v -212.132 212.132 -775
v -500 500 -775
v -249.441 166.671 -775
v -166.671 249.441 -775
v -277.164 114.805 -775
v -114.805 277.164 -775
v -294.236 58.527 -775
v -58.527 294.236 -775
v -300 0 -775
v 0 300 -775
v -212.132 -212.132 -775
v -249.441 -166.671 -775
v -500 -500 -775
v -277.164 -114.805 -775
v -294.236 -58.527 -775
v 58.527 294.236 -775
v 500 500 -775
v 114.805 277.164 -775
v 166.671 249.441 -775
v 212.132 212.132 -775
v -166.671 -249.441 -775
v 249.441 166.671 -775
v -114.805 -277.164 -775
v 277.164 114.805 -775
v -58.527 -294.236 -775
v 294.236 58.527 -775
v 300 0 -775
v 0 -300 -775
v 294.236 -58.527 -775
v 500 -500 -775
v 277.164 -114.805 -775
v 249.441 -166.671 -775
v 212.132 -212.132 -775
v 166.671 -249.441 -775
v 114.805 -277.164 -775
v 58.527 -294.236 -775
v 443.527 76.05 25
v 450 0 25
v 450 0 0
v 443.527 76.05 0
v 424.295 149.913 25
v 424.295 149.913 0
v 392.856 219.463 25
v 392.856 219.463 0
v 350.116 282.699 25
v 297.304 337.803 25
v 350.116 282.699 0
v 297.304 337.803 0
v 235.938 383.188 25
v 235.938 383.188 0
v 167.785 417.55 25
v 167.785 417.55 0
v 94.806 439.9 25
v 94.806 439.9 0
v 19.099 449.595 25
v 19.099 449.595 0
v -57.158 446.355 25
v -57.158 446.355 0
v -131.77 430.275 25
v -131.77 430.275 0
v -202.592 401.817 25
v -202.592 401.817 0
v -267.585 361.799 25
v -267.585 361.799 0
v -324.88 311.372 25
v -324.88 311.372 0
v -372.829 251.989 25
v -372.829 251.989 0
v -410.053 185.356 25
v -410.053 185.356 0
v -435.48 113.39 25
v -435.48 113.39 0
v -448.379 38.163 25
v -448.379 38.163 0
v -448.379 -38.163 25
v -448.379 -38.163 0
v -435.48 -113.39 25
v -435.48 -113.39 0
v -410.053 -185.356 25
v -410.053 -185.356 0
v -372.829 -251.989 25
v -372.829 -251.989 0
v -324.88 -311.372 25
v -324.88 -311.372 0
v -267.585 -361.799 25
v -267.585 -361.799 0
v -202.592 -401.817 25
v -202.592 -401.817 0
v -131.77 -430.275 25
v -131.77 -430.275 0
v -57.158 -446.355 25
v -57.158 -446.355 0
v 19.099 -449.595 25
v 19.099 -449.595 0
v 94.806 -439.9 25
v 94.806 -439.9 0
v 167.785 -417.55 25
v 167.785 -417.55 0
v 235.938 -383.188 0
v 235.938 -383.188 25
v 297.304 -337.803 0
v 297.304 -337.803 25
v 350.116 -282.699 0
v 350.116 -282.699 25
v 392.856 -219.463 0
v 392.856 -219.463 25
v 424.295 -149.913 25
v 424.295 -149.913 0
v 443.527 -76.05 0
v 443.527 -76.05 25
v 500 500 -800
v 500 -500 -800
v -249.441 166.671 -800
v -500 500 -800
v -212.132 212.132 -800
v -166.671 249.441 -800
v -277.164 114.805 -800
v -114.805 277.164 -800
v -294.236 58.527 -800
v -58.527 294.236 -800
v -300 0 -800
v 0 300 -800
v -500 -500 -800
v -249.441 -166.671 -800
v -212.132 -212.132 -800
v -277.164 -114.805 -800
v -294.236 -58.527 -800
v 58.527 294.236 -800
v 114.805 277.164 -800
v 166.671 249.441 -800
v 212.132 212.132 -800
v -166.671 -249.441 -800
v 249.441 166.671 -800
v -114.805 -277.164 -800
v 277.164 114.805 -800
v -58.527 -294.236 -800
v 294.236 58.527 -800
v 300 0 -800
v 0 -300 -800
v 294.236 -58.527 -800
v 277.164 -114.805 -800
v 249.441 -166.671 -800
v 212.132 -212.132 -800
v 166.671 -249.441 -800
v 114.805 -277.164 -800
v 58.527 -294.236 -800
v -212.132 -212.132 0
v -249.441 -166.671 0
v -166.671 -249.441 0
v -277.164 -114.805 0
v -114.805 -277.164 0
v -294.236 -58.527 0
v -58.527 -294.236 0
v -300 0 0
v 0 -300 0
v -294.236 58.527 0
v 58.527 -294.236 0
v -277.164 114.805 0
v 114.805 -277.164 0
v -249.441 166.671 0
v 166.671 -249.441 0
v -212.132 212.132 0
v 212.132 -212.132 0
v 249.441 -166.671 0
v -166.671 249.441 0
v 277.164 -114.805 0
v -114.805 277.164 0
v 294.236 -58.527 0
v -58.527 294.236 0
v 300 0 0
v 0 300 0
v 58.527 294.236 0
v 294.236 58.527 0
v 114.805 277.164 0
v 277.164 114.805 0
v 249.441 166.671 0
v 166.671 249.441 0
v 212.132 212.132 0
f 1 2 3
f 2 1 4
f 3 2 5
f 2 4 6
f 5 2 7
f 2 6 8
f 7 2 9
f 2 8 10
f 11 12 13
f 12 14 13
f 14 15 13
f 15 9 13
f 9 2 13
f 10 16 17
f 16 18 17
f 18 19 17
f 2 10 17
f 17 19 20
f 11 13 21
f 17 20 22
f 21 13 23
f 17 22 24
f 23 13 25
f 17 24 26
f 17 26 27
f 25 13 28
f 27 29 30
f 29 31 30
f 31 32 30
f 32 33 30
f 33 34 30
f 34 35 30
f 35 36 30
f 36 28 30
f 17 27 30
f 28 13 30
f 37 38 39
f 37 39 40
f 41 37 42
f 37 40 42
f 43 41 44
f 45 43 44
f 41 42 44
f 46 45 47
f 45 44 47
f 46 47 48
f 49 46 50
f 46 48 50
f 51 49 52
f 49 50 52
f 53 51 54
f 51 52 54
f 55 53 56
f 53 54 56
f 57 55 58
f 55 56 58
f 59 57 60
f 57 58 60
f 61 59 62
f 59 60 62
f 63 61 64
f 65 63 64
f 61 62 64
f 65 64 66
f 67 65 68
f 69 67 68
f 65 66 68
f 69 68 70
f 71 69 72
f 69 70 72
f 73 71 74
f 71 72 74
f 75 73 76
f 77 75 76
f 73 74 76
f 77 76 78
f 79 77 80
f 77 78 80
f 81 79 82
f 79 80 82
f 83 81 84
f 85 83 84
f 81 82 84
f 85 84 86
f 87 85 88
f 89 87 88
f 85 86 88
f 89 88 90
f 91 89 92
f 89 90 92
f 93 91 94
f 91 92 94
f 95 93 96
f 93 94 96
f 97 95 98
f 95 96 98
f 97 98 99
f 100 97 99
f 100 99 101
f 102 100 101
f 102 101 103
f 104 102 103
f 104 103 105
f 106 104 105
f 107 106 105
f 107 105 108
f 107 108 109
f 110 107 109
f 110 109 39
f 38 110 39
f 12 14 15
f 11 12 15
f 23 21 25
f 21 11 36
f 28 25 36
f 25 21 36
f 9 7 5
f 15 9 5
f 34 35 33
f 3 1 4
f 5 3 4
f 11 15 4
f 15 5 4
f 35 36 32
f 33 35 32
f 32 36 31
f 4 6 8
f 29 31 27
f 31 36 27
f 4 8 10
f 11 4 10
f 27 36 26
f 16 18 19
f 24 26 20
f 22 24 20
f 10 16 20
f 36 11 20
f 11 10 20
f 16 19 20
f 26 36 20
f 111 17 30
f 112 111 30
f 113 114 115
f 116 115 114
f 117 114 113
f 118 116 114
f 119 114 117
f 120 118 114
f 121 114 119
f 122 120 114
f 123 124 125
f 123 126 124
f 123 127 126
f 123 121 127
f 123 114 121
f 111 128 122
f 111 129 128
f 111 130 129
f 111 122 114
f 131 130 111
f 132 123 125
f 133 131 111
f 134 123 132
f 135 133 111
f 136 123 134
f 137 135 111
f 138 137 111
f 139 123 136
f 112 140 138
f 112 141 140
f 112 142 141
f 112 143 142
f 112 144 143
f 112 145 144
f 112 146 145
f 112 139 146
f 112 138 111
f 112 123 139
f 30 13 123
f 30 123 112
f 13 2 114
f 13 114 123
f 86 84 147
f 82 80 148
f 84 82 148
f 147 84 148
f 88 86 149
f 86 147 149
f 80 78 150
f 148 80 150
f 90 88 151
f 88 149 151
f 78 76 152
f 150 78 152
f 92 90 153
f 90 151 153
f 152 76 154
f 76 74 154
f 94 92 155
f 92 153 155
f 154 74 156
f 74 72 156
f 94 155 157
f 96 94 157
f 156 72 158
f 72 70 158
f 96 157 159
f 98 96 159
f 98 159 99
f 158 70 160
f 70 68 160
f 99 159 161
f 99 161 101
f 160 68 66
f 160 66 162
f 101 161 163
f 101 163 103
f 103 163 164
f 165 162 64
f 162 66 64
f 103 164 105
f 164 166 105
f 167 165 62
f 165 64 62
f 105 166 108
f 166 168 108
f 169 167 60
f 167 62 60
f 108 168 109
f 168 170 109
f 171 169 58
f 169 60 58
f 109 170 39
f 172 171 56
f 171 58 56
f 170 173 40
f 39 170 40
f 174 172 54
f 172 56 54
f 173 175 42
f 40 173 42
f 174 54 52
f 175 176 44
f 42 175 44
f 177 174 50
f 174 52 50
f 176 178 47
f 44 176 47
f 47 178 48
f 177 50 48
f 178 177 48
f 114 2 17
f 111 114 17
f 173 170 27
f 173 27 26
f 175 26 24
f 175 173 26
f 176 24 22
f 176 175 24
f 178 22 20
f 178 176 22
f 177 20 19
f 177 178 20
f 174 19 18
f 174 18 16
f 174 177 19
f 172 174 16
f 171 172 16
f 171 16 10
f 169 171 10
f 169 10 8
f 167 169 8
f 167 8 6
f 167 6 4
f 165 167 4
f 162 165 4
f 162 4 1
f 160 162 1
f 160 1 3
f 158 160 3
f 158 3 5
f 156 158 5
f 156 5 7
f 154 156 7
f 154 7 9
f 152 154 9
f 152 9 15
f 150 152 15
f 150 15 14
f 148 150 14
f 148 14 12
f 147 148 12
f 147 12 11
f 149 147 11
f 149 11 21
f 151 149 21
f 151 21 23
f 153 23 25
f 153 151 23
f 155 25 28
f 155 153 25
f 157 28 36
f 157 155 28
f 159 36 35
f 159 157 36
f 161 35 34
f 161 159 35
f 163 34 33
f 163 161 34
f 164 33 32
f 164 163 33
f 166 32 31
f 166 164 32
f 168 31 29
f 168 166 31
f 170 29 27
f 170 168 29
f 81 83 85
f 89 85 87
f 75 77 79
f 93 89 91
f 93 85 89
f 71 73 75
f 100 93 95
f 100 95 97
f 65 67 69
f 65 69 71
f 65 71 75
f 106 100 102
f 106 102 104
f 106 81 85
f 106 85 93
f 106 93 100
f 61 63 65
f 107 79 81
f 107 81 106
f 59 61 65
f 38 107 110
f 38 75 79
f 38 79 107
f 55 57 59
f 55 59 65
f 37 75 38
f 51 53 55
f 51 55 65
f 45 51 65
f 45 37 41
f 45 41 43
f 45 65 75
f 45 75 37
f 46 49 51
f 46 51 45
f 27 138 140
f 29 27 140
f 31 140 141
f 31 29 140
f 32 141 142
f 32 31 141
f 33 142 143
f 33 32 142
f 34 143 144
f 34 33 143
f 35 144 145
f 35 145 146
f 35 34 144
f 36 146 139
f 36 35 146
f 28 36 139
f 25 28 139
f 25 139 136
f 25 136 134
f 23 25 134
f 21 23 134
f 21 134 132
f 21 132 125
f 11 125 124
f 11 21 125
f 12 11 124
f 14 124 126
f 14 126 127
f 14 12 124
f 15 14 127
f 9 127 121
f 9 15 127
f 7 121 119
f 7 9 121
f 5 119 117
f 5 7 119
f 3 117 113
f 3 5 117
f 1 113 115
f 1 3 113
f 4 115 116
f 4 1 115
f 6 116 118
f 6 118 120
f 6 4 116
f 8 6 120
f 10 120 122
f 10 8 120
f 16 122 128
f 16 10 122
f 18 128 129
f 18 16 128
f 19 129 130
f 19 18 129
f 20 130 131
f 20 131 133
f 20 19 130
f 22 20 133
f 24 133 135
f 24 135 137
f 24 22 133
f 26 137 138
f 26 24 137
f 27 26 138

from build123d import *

# Parameters (mm, degrees)
F0_R     = 450
F1_DEPTH = 25
F2_R     = 300
F3_DEPTH = 800
F4_W     = 1000
F4_H     = 1000
F4_R     = 300
F5_DEPTH = 25


with BuildPart() as f1:
    # F0 (on Top) → F1 (new body)
    with BuildSketch(Plane.XY):
        Circle(F0_R)
    extrude(amount=F1_DEPTH)

    # F2 (on face) → F3 (join)
    with BuildSketch(Plane.XY.offset(25)):
        Circle(F2_R)
    extrude(amount=-F3_DEPTH)


with BuildPart() as f5:
    # F4 (on face) → F5 (new body)
    with BuildSketch(Plane(origin=(0, 0, -775), x_dir=(1, 0, 0), z_dir=(0, 0, -1))):
        Rectangle(F4_W, F4_H)
        Circle(F4_R, mode=Mode.SUBTRACT)
    extrude(amount=F5_DEPTH)


solid = Compound([f1.part, f5.part])
